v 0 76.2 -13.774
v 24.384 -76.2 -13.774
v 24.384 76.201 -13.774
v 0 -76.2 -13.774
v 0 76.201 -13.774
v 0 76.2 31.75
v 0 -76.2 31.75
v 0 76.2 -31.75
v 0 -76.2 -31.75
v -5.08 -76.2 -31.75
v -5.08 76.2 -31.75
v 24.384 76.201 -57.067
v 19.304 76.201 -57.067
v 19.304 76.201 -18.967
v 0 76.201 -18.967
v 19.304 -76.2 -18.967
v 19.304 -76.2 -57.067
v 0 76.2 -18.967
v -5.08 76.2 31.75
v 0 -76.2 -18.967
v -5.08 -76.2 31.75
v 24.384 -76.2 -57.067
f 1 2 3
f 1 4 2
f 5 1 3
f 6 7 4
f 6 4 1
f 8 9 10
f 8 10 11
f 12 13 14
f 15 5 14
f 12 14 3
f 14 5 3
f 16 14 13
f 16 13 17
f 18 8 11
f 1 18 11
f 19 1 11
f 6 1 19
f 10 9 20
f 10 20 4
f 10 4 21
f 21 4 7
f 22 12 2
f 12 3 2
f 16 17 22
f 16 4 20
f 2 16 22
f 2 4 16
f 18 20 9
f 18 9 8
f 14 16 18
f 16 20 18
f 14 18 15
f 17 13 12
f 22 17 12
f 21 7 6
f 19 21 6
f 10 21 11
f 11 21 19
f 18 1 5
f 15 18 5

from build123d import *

# Parameters (mm, degrees)
F0_W     = 152.4
F0_H     = 63.5
F1_DEPTH = 5.08
F3_W     = 152.400844
F3_H     = 5.193346
F4_DEPTH = 24.384
F5_W     = 5.08
F5_H     = 152.400844
F6_DEPTH = 38.1


with BuildPart() as f1:
    # F0 (on Right) → F1 (new body)
    with BuildSketch(Plane.YZ):
        Rectangle(F0_W, F0_H)
    extrude(amount=-F1_DEPTH)

    # F3 (on face) → F4 (join)
    with BuildSketch(Plane.YZ):
        with Locations((0.000302, -16.370494)):
            Rectangle(F3_W, F3_H)
    extrude(amount=F4_DEPTH)

    # F5 (on face) → F6 (join)
    with BuildSketch(Plane(origin=(0, 0, -18.967167), x_dir=(1, 0, 0), z_dir=(0, 0, -1))):
        with Locations((21.844, -0.000302)):
            Rectangle(F5_W, F5_H)
    extrude(amount=F6_DEPTH)


solid = f1.part
